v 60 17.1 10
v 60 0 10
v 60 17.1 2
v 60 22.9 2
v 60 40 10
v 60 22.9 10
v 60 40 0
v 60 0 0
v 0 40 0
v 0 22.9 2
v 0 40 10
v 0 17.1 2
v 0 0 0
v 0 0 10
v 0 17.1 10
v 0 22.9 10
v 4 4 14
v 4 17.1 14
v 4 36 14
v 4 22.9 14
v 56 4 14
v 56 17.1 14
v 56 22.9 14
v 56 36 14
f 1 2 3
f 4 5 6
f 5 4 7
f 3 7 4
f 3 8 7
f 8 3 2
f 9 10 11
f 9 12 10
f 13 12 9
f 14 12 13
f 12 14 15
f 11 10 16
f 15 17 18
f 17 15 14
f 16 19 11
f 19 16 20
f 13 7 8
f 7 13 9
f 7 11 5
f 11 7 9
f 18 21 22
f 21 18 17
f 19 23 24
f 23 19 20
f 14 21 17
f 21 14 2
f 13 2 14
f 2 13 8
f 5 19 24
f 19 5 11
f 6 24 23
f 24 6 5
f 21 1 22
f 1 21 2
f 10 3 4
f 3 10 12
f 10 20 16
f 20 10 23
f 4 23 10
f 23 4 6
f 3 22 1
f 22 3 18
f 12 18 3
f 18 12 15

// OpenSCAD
// booth/wall_foot.scad (7/23 - facade mode)
// Dead-simple foot block for the wall panels: a chamfered brick with one
// slot. Two per wall, pushed onto the bottom edge -> the wall stands alone.
// ~10 min each (vs 40 min for the full stand+clip plate). No floor needed.

include <../params.scad>;

foot_x = 60;                  // along the wall
foot_y = 40;                  // depth (anti-tip)
foot_h = 14;
slot_d = 12;                  // wall bottom tab is 12 tall -> flush

module wall_foot() {
    difference() {
        hull() {
            translate([0, 0, 0]) cube([foot_x, foot_y, foot_h - 4]);
            translate([4, 4, 0]) cube([foot_x - 8, foot_y - 8, foot_h]);
        }
        // slot for the panel (fits both the tab and the plain bottom edge)
        translate([-1, foot_y/2 - (wall_t + 0.8)/2, foot_h - slot_d])
            cube([foot_x + 2, wall_t + 0.8, slot_d + 1]);
    }
}

wall_foot();
